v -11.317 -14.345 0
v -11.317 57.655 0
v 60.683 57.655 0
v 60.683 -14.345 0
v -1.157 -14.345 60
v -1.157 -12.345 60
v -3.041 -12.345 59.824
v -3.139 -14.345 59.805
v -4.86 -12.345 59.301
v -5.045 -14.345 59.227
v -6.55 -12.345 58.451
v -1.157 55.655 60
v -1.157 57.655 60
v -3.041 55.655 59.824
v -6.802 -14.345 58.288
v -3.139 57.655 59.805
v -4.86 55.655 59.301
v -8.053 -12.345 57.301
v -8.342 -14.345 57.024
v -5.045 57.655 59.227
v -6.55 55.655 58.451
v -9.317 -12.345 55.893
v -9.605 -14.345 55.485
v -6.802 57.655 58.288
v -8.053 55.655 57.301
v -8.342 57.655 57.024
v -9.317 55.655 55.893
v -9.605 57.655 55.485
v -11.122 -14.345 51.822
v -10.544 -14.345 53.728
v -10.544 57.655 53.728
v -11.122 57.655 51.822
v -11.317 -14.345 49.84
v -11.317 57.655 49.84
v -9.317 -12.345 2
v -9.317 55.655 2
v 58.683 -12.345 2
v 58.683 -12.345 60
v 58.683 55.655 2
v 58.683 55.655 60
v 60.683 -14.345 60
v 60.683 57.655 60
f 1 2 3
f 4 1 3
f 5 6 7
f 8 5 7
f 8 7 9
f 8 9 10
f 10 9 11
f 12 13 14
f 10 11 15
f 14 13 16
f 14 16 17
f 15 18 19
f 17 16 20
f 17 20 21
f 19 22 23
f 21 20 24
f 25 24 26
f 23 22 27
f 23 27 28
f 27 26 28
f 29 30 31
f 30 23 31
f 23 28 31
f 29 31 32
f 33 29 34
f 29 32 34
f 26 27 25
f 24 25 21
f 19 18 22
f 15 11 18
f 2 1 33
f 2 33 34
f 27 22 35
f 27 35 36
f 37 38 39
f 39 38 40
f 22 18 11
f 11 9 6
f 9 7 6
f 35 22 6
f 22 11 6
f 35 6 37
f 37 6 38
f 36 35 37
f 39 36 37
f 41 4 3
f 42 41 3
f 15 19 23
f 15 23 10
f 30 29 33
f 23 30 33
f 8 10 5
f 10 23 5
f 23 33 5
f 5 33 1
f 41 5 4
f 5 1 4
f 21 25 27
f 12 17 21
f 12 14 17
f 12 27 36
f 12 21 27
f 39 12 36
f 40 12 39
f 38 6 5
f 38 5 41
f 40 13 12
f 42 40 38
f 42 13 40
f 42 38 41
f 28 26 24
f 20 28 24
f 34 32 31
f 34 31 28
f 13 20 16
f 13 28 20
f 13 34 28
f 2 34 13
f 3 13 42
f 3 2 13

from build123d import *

# Parameters (mm, degrees)
F0_W        = 72
F0_H        = 72
F1_DEPTH    = 60
F2_W        = 68
F2_H        = 68
F3_DEPTH    = 58
F4_T1_DEPTH = 122.8


# Not quite as in the source:
# - a fillet or chamfer that OpenCascade refuses, or shapes differently, is made with other operations: its cross-section is extruded or revolved along the edge and cut away or added


with BuildPart() as f1:
    # F0 (on Top) → F1 (new body)
    with BuildSketch(Plane.XY):
        with Locations((24.6826619834, 21.6548714693)):
            Rectangle(F0_W, F0_H)
    extrude(amount=F1_DEPTH)

    # F2 (on face) → F3 (cut)
    with BuildSketch(Plane.XY.offset(60)):
        with Locations((24.6826619834, 21.6548714693)):
            Rectangle(F2_W, F2_H)
    extrude(amount=-F3_DEPTH, mode=Mode.SUBTRACT)

    # F4: fillet of radius 10.16 on 1 edges, made by hand

    # F4_s2 → F4_t1 (cut)
    with BuildSketch(Plane.XZ.offset(-83.0548714693)):
        with BuildLine():
            ThreePointArc((-1.1573380166, 60), (-8.3415429135, 57.0242048969), (-11.3173380166, 49.84))
            Line((-11.3173380166, 49.84), (-11.3173380166, 60))
            Line((-11.3173380166, 60), (-1.1573380166, 60))
        make_face()
    extrude(amount=F4_T1_DEPTH, mode=Mode.SUBTRACT)


solid = f1.part
